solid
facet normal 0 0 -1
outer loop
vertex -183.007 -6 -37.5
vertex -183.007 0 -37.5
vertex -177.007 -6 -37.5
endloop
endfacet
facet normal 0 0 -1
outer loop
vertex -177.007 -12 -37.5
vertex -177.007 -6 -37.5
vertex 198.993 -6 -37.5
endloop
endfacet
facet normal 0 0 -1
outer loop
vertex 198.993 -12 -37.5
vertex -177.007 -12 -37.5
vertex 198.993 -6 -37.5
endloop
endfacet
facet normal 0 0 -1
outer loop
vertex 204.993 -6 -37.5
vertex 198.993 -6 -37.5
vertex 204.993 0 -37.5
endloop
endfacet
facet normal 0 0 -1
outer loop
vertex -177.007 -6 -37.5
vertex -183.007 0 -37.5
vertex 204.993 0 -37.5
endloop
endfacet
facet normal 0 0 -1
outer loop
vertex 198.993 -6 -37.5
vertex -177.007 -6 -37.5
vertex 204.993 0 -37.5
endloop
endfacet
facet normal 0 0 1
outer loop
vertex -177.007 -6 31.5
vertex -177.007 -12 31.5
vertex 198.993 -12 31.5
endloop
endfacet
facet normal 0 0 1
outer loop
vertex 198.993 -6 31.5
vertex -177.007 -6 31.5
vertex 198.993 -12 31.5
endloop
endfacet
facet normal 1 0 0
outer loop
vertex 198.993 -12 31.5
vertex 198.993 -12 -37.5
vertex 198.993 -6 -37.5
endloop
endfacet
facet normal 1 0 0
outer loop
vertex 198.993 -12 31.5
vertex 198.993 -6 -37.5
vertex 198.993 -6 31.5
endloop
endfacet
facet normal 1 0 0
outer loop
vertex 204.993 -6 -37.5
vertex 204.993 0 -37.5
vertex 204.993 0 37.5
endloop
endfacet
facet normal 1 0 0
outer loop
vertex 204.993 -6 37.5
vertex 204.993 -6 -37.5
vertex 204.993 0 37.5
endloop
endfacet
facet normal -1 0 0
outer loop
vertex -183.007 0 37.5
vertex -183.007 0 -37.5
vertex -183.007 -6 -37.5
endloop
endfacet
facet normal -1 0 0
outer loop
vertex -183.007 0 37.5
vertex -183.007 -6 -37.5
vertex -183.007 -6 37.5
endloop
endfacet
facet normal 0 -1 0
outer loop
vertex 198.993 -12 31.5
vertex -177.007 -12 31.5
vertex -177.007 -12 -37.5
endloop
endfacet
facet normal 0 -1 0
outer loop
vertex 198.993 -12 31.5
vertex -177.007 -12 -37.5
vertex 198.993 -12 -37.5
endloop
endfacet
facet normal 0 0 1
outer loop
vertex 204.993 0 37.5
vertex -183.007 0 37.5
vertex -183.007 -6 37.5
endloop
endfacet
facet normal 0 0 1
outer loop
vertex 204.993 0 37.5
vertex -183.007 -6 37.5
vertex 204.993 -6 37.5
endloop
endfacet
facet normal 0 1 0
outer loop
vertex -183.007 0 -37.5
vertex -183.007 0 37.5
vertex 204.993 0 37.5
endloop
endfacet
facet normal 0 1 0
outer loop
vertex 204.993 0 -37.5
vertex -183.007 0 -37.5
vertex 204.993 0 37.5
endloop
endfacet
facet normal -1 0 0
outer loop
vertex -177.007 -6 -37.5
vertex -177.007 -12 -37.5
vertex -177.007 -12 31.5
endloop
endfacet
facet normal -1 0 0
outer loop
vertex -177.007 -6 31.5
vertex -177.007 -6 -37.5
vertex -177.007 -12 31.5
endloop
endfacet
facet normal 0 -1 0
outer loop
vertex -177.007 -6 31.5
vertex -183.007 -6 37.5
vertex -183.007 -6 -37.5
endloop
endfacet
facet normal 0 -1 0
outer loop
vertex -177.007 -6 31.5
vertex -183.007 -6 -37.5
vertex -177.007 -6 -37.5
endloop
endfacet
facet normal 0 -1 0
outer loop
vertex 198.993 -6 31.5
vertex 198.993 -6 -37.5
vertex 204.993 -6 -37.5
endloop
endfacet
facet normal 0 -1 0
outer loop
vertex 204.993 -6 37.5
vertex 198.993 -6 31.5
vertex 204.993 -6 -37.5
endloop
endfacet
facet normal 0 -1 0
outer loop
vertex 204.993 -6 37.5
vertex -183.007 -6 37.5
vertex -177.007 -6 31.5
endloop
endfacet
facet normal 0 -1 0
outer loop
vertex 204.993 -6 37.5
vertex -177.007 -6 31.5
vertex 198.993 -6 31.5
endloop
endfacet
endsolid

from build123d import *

# Parameters (mm, degrees)
F0_W     = 388
F0_H     = 75
F1_DEPTH = 12
F2_W     = 6
F2_H     = 75
F3_DEPTH = 6
F4_W     = 6
F4_H     = 75
F5_DEPTH = 6
F6_W     = 376
F6_H     = 6
F7_DEPTH = 6


with BuildPart() as f1:
    # F0 (on Front) → F1 (new body)
    with BuildSketch(Plane.XZ):
        with Locations((10.992817, 0)):
            Rectangle(F0_W, F0_H)
    extrude(amount=F1_DEPTH)

    # F2 (on face) → F3 (cut)
    with BuildSketch(Plane.XZ.offset(12)):
        with Locations((-180.007183, 0)):
            Rectangle(F2_W, F2_H)
    extrude(amount=-F3_DEPTH, mode=Mode.SUBTRACT)

    # F4 (on face) → F5 (cut)
    with BuildSketch(Plane.XZ.offset(12)):
        with Locations((201.992817, 0)):
            Rectangle(F4_W, F4_H)
    extrude(amount=-F5_DEPTH, mode=Mode.SUBTRACT)

    # F6 (on face) → F7 (cut)
    with BuildSketch(Plane.XZ.offset(12)):
        with Locations((10.992817, 34.5)):
            Rectangle(F6_W, F6_H)
    extrude(amount=-F7_DEPTH, mode=Mode.SUBTRACT)


solid = f1.part
